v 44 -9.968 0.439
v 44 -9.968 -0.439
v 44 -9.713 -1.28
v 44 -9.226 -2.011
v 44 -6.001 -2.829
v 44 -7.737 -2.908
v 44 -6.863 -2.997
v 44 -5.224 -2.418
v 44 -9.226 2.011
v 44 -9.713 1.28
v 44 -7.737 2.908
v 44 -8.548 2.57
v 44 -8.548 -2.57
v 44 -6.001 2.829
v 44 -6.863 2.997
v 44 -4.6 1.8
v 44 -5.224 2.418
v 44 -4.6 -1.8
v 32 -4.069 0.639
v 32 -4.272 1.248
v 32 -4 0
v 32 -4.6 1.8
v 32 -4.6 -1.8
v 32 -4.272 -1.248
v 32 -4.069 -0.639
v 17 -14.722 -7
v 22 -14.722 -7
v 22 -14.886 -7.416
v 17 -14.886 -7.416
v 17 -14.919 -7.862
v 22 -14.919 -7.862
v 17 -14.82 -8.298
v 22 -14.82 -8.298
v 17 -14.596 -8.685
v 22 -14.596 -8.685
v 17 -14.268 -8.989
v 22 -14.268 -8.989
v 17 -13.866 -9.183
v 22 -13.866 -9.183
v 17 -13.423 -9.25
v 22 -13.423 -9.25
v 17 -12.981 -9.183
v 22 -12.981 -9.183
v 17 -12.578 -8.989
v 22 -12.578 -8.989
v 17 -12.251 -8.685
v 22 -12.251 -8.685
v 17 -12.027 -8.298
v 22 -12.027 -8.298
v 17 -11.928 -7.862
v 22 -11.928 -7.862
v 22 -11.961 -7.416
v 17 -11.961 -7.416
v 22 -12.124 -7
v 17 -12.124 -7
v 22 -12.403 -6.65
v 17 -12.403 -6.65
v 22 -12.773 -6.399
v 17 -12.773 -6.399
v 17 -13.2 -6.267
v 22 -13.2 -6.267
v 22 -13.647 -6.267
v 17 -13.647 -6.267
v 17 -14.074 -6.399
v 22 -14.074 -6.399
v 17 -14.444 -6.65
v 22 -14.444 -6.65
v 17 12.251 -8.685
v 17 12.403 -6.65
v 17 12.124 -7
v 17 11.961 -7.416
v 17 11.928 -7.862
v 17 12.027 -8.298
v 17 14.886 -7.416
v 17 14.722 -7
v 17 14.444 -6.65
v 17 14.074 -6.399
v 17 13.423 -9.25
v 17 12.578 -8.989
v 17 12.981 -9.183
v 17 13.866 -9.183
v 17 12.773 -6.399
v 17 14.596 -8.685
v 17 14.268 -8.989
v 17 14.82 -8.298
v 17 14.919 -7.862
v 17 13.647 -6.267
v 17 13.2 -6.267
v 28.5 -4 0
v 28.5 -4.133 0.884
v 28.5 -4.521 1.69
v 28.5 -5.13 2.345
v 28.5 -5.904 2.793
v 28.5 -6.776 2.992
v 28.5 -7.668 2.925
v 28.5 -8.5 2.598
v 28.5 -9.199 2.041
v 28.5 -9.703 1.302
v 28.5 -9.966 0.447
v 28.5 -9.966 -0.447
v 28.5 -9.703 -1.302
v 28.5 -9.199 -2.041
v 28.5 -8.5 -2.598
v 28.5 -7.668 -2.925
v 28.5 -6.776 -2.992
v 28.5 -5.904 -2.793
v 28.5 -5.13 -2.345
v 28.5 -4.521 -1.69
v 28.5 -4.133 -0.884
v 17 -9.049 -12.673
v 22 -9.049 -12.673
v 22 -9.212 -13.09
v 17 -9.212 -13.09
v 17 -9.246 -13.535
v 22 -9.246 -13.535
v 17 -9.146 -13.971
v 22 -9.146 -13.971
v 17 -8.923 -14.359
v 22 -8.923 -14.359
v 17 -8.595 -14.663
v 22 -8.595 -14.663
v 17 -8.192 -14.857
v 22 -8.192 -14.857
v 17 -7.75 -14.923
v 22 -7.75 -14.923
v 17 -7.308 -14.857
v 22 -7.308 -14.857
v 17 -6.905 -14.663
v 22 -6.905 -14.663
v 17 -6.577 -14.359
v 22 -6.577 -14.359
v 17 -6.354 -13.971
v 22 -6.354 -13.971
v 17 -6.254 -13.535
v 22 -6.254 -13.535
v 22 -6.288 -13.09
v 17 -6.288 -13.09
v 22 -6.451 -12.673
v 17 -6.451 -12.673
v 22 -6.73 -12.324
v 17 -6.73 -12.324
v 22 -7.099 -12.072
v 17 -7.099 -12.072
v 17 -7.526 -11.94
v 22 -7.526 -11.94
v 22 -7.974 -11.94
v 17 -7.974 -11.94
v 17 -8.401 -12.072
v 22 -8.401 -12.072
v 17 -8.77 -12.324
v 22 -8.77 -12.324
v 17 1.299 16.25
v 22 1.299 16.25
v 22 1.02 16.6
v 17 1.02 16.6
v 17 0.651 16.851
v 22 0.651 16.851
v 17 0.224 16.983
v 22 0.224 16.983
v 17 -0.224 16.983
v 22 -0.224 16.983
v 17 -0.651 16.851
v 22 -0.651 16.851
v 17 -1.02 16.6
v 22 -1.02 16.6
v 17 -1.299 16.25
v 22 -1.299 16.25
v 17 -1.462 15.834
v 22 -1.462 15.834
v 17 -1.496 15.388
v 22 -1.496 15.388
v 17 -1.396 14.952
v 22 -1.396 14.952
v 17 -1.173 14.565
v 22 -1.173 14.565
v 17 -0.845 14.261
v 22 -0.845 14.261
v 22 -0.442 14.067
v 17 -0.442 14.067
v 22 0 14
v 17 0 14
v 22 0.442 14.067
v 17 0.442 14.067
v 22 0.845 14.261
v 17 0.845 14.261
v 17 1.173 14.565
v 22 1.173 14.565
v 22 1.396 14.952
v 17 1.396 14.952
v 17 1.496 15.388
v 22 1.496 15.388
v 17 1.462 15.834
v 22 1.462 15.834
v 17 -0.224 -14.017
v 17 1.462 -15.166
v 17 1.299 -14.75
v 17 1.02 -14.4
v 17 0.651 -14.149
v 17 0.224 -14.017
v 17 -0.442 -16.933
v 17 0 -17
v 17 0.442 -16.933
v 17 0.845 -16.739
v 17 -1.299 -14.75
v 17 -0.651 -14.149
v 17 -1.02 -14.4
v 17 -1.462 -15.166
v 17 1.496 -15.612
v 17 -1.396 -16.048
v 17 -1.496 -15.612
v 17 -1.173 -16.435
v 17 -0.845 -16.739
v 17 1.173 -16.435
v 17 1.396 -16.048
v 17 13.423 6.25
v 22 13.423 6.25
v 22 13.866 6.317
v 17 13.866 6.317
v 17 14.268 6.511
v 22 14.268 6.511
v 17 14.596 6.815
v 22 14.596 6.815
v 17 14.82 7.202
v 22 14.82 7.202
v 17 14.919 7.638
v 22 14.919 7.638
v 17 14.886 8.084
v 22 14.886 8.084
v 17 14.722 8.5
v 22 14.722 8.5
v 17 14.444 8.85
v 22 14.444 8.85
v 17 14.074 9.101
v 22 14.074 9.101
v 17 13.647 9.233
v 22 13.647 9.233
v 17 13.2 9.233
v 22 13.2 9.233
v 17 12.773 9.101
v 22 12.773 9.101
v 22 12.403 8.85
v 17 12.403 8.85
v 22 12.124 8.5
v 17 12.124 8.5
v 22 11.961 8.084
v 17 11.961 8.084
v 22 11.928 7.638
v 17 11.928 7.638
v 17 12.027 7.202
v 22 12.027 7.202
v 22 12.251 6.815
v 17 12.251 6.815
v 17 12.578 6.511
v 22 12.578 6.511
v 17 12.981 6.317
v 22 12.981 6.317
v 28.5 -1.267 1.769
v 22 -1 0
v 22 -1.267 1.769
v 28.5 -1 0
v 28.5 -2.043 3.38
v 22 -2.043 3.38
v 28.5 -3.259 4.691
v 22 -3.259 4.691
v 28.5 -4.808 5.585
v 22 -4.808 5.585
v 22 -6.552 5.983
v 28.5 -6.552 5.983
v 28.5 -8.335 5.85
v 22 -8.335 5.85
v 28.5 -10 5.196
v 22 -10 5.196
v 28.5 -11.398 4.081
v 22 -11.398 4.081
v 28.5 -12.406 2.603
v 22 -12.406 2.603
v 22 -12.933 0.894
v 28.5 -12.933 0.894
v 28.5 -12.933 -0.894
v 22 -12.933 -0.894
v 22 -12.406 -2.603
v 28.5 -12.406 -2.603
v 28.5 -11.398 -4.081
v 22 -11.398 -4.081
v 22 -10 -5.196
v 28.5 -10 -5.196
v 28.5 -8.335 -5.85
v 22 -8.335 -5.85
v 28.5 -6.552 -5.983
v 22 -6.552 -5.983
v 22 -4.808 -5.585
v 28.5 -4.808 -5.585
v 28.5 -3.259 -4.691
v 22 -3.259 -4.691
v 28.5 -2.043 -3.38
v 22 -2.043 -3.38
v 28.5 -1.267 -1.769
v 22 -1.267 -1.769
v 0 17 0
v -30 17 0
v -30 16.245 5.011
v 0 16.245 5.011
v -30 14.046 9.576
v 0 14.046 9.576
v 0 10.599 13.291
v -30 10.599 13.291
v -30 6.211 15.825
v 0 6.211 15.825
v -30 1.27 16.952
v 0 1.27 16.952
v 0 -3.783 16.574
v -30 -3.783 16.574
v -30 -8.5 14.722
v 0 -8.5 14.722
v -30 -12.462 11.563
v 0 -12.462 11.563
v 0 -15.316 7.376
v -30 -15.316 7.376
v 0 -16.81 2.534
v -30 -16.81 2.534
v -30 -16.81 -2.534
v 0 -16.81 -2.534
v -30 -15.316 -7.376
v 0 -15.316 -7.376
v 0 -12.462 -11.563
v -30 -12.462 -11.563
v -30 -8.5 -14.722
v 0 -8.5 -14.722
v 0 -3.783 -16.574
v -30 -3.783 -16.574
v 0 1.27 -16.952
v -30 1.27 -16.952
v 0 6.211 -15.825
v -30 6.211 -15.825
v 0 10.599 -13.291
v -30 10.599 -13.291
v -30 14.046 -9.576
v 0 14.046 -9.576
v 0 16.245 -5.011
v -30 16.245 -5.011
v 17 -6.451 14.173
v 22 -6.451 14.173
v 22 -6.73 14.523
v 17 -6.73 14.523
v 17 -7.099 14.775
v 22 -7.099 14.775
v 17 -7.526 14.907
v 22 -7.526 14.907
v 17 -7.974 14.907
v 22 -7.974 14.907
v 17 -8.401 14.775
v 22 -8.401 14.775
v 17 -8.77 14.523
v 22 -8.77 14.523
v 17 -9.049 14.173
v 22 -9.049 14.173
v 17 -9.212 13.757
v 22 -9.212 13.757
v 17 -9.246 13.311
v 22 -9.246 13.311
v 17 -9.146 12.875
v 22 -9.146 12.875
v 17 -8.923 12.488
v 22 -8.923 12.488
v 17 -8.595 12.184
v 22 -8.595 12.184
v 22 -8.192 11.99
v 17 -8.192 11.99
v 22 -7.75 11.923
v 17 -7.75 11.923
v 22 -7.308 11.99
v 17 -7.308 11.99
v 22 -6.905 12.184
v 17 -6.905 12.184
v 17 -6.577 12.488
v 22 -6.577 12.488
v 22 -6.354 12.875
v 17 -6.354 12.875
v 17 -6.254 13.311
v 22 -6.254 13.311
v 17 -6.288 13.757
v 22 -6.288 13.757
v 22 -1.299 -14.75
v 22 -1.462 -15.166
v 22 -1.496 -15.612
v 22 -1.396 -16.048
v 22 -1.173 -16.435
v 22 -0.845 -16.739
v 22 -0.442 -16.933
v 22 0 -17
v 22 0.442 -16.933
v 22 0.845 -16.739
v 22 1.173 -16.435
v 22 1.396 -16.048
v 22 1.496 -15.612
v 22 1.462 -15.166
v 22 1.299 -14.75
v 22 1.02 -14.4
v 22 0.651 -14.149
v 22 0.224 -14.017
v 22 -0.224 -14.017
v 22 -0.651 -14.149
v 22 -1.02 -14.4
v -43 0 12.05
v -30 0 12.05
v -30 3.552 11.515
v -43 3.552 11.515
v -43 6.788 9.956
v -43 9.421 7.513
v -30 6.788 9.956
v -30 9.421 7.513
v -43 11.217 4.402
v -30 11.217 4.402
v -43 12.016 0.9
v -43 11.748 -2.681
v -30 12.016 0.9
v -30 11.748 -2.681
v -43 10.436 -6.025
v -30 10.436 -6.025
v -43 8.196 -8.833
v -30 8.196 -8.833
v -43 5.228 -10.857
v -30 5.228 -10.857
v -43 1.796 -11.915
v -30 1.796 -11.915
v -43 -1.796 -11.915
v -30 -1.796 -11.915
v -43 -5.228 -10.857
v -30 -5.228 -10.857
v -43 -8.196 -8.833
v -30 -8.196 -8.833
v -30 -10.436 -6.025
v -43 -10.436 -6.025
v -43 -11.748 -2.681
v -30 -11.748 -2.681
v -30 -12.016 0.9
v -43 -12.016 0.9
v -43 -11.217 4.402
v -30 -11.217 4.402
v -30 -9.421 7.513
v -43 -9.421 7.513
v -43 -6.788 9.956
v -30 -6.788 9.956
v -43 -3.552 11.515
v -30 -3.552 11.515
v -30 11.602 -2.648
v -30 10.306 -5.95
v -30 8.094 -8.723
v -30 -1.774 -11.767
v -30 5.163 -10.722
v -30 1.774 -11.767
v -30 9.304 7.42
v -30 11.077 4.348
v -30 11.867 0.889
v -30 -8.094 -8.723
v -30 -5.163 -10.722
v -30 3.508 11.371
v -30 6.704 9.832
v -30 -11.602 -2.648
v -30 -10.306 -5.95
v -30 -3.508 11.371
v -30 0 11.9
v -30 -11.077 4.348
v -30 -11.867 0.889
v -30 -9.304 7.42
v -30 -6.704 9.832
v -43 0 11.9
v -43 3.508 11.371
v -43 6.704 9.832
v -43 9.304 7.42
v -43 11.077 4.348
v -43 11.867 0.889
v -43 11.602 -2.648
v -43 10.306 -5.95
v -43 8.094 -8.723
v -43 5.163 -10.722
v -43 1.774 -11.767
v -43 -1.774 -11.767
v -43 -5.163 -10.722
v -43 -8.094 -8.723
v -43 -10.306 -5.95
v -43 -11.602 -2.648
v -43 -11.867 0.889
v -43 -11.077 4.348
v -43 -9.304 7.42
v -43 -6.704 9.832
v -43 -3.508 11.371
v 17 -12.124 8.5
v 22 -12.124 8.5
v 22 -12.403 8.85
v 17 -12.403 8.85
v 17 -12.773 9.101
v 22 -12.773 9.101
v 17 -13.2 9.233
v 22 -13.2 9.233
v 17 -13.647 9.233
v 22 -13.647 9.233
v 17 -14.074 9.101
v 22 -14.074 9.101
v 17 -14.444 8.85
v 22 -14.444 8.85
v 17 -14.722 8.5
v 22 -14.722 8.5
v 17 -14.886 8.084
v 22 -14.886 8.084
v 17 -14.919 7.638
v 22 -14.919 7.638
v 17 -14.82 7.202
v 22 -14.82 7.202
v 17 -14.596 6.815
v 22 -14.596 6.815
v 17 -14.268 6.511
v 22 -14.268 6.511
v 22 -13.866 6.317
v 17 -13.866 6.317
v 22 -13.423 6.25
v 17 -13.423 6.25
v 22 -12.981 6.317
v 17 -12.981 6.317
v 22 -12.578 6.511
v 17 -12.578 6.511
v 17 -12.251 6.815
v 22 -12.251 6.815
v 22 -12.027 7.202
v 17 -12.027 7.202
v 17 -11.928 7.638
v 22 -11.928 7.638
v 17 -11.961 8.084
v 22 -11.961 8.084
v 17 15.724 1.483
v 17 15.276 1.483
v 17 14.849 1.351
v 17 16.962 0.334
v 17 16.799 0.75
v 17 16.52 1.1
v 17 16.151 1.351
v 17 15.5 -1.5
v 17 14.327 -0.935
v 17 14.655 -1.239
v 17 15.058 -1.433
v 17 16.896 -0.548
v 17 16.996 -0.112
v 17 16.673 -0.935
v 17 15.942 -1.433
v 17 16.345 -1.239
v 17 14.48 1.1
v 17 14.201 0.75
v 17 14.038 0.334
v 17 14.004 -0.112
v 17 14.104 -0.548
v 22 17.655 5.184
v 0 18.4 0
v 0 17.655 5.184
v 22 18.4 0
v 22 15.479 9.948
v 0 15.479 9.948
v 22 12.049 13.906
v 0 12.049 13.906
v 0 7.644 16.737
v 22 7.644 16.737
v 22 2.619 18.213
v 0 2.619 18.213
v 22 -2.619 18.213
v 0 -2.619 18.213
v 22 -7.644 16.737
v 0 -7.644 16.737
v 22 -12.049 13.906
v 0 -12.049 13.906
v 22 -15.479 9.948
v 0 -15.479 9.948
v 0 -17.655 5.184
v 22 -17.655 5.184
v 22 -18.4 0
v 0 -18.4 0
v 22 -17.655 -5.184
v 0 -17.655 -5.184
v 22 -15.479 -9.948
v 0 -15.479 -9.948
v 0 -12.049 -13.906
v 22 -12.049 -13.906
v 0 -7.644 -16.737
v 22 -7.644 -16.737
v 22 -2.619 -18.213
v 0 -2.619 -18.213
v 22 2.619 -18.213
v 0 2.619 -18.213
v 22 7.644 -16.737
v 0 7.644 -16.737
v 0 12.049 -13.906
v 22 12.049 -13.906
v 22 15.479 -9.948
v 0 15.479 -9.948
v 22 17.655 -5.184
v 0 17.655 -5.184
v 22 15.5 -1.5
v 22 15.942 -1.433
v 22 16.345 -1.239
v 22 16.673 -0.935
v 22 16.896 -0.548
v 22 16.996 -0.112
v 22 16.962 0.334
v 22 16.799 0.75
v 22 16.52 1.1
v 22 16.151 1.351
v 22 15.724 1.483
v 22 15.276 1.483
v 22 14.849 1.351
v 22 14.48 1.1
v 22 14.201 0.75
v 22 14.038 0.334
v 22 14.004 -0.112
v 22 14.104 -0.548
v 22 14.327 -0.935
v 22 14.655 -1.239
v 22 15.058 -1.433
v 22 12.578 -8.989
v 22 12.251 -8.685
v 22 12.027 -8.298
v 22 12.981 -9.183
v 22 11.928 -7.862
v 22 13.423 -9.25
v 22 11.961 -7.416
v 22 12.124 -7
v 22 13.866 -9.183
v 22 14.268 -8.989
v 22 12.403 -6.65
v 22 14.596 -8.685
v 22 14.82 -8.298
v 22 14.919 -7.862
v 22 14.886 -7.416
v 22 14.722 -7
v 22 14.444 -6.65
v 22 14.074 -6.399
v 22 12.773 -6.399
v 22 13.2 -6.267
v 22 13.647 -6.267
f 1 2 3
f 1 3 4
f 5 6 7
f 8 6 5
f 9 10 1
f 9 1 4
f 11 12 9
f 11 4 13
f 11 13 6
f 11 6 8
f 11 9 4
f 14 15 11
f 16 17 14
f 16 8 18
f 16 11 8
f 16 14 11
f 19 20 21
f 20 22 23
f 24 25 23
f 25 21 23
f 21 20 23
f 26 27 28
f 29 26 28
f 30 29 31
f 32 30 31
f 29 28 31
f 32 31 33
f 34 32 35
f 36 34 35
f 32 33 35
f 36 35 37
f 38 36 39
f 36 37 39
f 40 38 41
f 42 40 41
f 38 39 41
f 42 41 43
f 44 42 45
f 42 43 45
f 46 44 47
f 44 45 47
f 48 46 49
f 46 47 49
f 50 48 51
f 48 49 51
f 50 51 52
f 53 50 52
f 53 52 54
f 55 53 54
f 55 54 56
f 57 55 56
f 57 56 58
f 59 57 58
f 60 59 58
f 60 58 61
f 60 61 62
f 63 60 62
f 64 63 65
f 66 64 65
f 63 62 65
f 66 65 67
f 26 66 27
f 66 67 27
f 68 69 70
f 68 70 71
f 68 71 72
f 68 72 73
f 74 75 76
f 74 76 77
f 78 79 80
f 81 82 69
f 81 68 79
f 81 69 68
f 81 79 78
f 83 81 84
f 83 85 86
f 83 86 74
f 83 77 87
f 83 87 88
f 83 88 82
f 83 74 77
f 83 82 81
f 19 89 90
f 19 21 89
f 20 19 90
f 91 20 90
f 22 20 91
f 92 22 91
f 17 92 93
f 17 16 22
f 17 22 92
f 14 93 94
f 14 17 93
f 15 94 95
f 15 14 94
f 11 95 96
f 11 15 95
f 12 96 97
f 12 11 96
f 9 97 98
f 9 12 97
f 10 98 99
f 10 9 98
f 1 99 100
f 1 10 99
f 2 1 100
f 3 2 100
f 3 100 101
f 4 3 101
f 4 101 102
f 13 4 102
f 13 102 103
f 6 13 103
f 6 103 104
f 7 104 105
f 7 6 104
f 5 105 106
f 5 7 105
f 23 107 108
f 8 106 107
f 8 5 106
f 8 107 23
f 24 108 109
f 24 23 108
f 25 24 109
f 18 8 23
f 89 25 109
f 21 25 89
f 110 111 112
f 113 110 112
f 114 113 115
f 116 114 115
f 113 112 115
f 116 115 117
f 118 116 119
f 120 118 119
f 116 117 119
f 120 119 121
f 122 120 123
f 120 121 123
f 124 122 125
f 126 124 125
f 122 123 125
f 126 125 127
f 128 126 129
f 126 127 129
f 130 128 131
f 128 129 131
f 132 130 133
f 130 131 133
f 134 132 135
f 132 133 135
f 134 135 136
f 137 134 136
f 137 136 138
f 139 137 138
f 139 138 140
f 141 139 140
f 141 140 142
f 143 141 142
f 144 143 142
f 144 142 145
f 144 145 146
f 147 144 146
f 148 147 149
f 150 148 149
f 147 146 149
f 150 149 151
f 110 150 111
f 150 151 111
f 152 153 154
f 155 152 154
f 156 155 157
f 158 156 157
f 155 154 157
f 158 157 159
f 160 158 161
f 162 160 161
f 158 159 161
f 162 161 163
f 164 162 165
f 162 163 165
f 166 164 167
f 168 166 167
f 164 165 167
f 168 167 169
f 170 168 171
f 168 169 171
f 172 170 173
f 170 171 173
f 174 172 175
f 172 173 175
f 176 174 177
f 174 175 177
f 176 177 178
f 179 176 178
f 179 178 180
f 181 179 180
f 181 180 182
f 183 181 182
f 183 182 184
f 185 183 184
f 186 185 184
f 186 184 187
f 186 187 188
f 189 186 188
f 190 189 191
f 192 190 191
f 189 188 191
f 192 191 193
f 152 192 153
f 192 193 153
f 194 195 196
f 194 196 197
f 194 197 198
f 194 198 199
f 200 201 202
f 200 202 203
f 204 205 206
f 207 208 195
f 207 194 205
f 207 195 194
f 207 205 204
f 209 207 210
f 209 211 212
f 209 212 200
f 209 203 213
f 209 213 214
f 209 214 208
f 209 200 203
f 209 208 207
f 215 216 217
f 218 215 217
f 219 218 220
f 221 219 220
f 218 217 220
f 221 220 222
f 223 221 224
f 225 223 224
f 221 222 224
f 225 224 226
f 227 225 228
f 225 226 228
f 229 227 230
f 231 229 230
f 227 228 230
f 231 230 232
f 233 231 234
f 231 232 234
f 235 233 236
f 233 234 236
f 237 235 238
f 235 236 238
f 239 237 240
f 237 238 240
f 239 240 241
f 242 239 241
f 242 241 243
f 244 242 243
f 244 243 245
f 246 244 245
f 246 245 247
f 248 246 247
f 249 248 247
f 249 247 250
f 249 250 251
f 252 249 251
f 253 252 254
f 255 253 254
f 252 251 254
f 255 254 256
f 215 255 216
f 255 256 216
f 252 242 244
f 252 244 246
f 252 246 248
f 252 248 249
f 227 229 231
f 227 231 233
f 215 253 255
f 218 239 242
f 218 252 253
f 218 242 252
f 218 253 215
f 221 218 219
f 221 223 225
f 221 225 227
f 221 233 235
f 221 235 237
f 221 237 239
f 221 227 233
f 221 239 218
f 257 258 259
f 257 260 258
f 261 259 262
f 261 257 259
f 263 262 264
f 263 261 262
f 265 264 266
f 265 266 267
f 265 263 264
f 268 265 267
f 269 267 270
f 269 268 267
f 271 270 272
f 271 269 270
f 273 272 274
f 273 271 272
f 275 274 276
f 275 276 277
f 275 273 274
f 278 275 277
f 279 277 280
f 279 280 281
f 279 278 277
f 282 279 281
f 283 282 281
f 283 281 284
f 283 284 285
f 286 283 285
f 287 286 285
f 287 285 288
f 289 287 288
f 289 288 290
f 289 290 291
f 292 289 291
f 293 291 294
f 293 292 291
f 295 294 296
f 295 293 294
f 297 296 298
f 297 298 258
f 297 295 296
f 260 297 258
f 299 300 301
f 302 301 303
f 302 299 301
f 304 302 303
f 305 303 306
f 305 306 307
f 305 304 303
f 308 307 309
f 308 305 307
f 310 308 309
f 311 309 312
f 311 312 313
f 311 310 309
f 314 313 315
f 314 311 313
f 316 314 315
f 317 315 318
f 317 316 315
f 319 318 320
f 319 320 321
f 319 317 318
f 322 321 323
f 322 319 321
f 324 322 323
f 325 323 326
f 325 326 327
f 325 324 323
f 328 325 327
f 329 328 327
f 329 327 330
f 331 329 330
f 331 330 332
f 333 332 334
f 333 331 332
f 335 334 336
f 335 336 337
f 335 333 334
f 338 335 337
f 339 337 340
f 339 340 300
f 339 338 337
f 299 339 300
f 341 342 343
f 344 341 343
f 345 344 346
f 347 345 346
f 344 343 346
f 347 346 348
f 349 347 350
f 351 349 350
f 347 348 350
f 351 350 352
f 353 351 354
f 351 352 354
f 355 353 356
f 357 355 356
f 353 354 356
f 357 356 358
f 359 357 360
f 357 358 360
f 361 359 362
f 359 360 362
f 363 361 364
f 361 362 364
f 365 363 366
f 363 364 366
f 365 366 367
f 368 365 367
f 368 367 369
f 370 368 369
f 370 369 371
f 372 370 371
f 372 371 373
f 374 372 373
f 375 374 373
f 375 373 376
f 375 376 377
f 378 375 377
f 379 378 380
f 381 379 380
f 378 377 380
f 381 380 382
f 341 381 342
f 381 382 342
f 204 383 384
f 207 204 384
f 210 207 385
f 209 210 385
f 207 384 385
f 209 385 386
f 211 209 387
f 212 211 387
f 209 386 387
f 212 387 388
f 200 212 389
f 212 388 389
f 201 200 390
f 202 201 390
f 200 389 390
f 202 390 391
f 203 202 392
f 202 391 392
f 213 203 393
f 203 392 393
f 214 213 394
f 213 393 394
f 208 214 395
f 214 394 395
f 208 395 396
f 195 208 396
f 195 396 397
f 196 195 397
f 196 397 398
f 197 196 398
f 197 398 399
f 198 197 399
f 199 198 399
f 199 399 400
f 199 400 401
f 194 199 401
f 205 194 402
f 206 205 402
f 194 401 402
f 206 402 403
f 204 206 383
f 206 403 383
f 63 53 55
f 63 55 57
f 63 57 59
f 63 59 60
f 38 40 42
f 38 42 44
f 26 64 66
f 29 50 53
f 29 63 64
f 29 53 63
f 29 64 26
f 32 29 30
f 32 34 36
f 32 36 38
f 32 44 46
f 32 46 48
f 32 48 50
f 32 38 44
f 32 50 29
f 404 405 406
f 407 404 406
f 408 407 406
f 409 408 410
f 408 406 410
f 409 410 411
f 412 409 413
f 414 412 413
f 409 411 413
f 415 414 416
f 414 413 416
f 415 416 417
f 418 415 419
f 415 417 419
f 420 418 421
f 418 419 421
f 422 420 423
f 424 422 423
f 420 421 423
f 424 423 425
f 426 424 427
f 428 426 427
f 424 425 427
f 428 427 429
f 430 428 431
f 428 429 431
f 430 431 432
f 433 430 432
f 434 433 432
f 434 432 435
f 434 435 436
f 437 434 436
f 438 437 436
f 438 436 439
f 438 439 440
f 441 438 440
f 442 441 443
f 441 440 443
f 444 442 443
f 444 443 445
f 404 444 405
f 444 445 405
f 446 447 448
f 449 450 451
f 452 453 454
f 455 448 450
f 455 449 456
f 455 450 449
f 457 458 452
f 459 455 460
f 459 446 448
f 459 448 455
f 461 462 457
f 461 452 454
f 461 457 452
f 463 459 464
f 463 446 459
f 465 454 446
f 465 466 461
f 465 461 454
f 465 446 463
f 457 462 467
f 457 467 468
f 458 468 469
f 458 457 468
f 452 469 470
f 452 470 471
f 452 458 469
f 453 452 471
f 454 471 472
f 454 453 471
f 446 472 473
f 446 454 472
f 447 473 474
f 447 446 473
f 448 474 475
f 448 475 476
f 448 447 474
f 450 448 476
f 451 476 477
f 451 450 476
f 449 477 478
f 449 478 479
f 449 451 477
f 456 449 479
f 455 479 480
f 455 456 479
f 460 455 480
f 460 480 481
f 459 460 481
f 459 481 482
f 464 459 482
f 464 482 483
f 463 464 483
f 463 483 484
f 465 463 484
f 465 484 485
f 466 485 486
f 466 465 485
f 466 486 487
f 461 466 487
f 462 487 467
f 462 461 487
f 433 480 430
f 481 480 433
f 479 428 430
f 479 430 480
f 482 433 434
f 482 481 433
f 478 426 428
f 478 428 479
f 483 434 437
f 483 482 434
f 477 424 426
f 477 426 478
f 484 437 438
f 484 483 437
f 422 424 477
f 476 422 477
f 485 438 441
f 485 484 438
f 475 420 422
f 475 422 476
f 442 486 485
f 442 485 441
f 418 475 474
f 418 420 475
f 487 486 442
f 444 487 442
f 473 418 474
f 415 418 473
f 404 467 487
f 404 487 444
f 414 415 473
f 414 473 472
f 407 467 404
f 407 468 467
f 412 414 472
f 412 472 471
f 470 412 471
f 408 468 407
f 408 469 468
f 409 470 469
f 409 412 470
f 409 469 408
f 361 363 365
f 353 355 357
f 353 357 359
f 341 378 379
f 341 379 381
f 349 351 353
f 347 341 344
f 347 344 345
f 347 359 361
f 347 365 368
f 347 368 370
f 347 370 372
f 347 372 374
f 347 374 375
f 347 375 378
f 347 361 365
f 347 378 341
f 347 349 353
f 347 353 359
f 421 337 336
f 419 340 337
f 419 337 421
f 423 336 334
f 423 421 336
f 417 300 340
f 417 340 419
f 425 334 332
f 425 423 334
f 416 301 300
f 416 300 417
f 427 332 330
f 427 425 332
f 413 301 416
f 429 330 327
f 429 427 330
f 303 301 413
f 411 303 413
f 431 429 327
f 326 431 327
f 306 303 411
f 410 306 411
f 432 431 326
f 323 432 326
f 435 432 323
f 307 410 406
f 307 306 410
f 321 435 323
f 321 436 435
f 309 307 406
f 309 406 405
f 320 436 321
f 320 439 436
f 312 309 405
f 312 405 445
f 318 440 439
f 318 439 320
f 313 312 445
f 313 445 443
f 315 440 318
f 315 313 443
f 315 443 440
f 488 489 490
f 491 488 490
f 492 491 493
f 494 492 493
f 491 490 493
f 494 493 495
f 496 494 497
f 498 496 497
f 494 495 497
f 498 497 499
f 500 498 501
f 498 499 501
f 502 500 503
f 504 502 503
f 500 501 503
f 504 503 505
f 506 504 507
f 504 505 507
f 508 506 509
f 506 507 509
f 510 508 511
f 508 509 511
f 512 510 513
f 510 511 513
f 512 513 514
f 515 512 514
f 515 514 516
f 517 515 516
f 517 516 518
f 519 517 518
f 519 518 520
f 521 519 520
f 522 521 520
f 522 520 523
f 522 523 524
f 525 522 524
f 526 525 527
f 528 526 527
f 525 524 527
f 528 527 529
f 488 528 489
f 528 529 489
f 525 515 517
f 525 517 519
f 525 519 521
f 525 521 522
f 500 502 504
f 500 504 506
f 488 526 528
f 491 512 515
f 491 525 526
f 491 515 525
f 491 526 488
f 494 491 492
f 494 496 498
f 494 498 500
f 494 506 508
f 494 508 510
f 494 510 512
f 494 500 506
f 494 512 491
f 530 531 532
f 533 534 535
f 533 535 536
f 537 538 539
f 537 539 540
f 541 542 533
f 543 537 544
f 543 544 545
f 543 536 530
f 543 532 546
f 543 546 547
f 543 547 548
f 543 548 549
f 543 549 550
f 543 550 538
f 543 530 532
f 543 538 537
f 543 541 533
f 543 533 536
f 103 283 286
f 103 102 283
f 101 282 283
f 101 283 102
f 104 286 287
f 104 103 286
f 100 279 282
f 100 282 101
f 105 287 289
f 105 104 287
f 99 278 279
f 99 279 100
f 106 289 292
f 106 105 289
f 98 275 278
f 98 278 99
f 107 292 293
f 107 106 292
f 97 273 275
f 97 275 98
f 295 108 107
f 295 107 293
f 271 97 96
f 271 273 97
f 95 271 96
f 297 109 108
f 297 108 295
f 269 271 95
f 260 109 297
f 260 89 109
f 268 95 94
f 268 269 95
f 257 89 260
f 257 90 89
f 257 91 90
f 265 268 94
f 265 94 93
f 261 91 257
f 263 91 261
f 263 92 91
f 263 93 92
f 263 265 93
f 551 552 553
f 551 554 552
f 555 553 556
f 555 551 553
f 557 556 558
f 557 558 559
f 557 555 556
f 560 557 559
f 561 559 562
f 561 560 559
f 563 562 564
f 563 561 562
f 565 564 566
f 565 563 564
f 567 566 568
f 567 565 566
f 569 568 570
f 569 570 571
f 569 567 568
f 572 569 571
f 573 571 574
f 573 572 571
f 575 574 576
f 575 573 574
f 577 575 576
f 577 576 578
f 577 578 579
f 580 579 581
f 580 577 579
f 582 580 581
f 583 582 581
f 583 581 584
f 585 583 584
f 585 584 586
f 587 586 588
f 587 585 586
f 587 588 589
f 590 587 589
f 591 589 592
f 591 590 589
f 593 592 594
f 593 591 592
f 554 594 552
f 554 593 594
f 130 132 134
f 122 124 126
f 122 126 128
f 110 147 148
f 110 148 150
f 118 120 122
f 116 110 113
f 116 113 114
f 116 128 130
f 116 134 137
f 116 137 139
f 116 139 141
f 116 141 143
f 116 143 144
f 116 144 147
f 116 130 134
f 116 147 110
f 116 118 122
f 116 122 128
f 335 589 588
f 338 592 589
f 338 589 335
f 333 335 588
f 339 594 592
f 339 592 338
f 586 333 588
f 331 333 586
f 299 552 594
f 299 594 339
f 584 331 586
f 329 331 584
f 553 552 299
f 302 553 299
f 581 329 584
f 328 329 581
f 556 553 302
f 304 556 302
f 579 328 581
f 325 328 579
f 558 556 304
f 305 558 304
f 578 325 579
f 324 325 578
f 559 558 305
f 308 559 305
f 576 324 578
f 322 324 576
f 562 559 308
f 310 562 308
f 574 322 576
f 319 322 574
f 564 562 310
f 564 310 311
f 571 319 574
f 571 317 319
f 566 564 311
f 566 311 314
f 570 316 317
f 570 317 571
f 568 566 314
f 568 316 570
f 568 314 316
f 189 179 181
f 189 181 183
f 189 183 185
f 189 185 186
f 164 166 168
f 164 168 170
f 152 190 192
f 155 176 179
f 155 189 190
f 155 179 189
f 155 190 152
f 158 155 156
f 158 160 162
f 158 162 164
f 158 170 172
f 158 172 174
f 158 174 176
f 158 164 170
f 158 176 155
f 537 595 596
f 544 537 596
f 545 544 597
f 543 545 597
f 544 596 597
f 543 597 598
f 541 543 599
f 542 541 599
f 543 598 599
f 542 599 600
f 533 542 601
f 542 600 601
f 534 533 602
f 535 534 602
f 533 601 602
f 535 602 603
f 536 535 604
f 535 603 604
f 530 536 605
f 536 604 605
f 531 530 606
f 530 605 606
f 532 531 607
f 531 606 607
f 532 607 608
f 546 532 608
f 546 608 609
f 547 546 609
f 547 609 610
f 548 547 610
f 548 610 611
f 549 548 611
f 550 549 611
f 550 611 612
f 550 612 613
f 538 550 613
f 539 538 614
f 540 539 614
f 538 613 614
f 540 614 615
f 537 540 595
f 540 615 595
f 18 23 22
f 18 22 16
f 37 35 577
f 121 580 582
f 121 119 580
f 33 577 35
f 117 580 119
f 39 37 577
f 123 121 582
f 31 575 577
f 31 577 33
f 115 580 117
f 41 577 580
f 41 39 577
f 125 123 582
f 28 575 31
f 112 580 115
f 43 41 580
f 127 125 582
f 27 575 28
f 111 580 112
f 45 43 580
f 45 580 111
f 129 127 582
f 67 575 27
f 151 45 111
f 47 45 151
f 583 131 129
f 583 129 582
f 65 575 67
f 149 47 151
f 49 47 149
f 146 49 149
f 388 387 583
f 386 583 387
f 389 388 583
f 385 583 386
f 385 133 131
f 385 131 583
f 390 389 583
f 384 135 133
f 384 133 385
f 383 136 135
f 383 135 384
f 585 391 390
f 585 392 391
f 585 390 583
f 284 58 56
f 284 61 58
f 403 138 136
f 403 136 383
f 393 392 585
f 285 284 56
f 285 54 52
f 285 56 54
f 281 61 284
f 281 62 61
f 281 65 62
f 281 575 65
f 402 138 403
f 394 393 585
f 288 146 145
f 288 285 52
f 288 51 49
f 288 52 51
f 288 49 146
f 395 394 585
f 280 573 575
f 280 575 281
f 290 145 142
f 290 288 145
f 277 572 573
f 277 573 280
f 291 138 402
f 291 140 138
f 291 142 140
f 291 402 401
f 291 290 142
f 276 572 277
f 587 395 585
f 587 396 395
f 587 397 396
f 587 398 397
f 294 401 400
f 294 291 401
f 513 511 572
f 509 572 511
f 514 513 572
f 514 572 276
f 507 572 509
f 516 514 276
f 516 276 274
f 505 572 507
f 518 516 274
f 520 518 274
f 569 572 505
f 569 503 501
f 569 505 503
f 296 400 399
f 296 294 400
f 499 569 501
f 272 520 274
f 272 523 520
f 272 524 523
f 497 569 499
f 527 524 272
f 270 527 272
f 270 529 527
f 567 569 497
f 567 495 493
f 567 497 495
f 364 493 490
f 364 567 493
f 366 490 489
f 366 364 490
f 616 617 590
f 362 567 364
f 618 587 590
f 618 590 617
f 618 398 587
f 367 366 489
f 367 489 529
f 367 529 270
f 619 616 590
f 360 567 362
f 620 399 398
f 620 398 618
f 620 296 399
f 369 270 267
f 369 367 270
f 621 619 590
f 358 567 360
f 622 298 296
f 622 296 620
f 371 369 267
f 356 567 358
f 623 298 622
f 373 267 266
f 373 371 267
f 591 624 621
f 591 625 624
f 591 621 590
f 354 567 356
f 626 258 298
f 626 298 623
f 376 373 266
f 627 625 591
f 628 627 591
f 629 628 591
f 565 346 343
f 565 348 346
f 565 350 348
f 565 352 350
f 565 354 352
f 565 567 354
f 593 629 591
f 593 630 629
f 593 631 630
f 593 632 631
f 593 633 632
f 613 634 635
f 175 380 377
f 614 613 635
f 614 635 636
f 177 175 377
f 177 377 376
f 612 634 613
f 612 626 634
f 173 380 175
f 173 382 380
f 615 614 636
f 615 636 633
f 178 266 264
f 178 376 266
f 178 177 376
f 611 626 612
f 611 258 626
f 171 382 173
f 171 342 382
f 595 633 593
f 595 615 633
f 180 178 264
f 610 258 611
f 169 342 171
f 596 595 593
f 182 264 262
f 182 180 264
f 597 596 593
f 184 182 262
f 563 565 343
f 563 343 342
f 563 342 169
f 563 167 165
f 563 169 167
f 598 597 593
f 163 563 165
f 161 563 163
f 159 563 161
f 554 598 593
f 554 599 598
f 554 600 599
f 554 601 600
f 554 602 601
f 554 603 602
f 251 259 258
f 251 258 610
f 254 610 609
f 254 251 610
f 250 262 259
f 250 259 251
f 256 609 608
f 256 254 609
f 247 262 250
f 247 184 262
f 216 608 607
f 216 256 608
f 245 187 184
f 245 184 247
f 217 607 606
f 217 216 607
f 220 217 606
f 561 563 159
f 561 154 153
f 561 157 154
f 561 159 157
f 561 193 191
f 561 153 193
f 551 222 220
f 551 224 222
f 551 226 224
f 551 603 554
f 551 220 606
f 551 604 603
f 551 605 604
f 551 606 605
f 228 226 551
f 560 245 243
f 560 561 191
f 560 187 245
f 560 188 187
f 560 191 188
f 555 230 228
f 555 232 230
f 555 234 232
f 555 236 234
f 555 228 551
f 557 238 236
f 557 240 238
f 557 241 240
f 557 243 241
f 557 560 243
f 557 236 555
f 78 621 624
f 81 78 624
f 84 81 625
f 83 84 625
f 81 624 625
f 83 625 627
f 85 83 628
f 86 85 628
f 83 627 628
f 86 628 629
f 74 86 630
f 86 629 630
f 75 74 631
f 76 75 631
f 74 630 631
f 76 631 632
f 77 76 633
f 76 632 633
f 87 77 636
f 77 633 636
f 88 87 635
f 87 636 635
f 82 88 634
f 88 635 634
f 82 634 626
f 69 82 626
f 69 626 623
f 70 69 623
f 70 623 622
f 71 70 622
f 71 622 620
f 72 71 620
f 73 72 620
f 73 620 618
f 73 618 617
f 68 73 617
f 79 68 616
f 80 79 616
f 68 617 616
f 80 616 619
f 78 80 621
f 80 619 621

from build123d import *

# Parameters (mm, degrees)
ENL_V_MAT_EXTRU_1_DEPTH      = 10
ENL_V_MAT_EXTRU_1_DEPTH_BACK = 10
ESQUISSE4_W                  = 18.656759262
ESQUISSE4_H                  = 11.470185
ESQUISSE5_R                  = 12.05
ESQUISSE5_R_2                = 11.9
BOSS_EXTRU_1_DEPTH           = 13
ESQUISSE6_R                  = 1.5
ENL_V_MAT_EXTRU_2_DEPTH      = 5
R_P_TITION_CIRCULAIRE1_COUNT = 3


with BuildPart() as part:
    # Esquisse1 → Révolution1 (revolve)
    with BuildSketch(Plane.XY):
        Polygon((-30, 0), (-30, 17), (0, 17), (0, 18.4), (22, 18.4), (22, 0), align=None)
    revolve(axis=Axis((-59.117838542, 0, 0), (1, 0, 0)))

    # Esquisse3 → Révolution2 (revolve)
    with BuildSketch(Plane.XY):
        Polygon((22, -1), (28.5, -1), (28.5, -4), (44, -4), (44, -7), (22, -7), align=None)
    revolve(axis=Axis((8.410725031, -7, 0), (1, 0, 0)))

    # Esquisse4 → Enlèv. mat.-Extru.1 (cut, two sides: drawn at the far end of the back side and taken through both)
    with BuildSketch(Plane.XY.offset(-ENL_V_MAT_EXTRU_1_DEPTH_BACK)):
        with Locations((41.328379631, 1.1350925)):
            Rectangle(ESQUISSE4_W, ESQUISSE4_H)
    extrude(amount=ENL_V_MAT_EXTRU_1_DEPTH + ENL_V_MAT_EXTRU_1_DEPTH_BACK, mode=Mode.SUBTRACT)

    # Esquisse5 → Boss.-Extru.1 (add)
    with BuildSketch(Plane.ZY.offset(30)):
        Circle(ESQUISSE5_R)
        Circle(ESQUISSE5_R_2, mode=Mode.SUBTRACT)
    extrude(amount=BOSS_EXTRU_1_DEPTH)

    # Esquisse6 → Enlèv. mat.-Extru.2 (cut)
    with BuildSketch(Plane(origin=(22, 0, 0), x_dir=(0, 0, -1), z_dir=(1, 0, 0))):
        with Locations((0, 15.5)):
            Circle(ESQUISSE6_R)
        with Locations((7.75, 13.423393759)):
            Circle(ESQUISSE6_R)
        with Locations((-7.75, 13.423393759)):
            Circle(ESQUISSE6_R)
    enl_v_mat_extru_2 = extrude(amount=-ENL_V_MAT_EXTRU_2_DEPTH, mode=Mode.SUBTRACT)

    # Répétition circulaire1: Enlèv. mat.-Extru.2 ×3 about axis
    r_p_tition_circulaire1_axis = Axis((22, 0, 0), (-1, 0, 0))
    for i in range(1, R_P_TITION_CIRCULAIRE1_COUNT):
        add(enl_v_mat_extru_2.rotate(r_p_tition_circulaire1_axis, i * 360 / R_P_TITION_CIRCULAIRE1_COUNT), mode=Mode.SUBTRACT)


solid = part.part
